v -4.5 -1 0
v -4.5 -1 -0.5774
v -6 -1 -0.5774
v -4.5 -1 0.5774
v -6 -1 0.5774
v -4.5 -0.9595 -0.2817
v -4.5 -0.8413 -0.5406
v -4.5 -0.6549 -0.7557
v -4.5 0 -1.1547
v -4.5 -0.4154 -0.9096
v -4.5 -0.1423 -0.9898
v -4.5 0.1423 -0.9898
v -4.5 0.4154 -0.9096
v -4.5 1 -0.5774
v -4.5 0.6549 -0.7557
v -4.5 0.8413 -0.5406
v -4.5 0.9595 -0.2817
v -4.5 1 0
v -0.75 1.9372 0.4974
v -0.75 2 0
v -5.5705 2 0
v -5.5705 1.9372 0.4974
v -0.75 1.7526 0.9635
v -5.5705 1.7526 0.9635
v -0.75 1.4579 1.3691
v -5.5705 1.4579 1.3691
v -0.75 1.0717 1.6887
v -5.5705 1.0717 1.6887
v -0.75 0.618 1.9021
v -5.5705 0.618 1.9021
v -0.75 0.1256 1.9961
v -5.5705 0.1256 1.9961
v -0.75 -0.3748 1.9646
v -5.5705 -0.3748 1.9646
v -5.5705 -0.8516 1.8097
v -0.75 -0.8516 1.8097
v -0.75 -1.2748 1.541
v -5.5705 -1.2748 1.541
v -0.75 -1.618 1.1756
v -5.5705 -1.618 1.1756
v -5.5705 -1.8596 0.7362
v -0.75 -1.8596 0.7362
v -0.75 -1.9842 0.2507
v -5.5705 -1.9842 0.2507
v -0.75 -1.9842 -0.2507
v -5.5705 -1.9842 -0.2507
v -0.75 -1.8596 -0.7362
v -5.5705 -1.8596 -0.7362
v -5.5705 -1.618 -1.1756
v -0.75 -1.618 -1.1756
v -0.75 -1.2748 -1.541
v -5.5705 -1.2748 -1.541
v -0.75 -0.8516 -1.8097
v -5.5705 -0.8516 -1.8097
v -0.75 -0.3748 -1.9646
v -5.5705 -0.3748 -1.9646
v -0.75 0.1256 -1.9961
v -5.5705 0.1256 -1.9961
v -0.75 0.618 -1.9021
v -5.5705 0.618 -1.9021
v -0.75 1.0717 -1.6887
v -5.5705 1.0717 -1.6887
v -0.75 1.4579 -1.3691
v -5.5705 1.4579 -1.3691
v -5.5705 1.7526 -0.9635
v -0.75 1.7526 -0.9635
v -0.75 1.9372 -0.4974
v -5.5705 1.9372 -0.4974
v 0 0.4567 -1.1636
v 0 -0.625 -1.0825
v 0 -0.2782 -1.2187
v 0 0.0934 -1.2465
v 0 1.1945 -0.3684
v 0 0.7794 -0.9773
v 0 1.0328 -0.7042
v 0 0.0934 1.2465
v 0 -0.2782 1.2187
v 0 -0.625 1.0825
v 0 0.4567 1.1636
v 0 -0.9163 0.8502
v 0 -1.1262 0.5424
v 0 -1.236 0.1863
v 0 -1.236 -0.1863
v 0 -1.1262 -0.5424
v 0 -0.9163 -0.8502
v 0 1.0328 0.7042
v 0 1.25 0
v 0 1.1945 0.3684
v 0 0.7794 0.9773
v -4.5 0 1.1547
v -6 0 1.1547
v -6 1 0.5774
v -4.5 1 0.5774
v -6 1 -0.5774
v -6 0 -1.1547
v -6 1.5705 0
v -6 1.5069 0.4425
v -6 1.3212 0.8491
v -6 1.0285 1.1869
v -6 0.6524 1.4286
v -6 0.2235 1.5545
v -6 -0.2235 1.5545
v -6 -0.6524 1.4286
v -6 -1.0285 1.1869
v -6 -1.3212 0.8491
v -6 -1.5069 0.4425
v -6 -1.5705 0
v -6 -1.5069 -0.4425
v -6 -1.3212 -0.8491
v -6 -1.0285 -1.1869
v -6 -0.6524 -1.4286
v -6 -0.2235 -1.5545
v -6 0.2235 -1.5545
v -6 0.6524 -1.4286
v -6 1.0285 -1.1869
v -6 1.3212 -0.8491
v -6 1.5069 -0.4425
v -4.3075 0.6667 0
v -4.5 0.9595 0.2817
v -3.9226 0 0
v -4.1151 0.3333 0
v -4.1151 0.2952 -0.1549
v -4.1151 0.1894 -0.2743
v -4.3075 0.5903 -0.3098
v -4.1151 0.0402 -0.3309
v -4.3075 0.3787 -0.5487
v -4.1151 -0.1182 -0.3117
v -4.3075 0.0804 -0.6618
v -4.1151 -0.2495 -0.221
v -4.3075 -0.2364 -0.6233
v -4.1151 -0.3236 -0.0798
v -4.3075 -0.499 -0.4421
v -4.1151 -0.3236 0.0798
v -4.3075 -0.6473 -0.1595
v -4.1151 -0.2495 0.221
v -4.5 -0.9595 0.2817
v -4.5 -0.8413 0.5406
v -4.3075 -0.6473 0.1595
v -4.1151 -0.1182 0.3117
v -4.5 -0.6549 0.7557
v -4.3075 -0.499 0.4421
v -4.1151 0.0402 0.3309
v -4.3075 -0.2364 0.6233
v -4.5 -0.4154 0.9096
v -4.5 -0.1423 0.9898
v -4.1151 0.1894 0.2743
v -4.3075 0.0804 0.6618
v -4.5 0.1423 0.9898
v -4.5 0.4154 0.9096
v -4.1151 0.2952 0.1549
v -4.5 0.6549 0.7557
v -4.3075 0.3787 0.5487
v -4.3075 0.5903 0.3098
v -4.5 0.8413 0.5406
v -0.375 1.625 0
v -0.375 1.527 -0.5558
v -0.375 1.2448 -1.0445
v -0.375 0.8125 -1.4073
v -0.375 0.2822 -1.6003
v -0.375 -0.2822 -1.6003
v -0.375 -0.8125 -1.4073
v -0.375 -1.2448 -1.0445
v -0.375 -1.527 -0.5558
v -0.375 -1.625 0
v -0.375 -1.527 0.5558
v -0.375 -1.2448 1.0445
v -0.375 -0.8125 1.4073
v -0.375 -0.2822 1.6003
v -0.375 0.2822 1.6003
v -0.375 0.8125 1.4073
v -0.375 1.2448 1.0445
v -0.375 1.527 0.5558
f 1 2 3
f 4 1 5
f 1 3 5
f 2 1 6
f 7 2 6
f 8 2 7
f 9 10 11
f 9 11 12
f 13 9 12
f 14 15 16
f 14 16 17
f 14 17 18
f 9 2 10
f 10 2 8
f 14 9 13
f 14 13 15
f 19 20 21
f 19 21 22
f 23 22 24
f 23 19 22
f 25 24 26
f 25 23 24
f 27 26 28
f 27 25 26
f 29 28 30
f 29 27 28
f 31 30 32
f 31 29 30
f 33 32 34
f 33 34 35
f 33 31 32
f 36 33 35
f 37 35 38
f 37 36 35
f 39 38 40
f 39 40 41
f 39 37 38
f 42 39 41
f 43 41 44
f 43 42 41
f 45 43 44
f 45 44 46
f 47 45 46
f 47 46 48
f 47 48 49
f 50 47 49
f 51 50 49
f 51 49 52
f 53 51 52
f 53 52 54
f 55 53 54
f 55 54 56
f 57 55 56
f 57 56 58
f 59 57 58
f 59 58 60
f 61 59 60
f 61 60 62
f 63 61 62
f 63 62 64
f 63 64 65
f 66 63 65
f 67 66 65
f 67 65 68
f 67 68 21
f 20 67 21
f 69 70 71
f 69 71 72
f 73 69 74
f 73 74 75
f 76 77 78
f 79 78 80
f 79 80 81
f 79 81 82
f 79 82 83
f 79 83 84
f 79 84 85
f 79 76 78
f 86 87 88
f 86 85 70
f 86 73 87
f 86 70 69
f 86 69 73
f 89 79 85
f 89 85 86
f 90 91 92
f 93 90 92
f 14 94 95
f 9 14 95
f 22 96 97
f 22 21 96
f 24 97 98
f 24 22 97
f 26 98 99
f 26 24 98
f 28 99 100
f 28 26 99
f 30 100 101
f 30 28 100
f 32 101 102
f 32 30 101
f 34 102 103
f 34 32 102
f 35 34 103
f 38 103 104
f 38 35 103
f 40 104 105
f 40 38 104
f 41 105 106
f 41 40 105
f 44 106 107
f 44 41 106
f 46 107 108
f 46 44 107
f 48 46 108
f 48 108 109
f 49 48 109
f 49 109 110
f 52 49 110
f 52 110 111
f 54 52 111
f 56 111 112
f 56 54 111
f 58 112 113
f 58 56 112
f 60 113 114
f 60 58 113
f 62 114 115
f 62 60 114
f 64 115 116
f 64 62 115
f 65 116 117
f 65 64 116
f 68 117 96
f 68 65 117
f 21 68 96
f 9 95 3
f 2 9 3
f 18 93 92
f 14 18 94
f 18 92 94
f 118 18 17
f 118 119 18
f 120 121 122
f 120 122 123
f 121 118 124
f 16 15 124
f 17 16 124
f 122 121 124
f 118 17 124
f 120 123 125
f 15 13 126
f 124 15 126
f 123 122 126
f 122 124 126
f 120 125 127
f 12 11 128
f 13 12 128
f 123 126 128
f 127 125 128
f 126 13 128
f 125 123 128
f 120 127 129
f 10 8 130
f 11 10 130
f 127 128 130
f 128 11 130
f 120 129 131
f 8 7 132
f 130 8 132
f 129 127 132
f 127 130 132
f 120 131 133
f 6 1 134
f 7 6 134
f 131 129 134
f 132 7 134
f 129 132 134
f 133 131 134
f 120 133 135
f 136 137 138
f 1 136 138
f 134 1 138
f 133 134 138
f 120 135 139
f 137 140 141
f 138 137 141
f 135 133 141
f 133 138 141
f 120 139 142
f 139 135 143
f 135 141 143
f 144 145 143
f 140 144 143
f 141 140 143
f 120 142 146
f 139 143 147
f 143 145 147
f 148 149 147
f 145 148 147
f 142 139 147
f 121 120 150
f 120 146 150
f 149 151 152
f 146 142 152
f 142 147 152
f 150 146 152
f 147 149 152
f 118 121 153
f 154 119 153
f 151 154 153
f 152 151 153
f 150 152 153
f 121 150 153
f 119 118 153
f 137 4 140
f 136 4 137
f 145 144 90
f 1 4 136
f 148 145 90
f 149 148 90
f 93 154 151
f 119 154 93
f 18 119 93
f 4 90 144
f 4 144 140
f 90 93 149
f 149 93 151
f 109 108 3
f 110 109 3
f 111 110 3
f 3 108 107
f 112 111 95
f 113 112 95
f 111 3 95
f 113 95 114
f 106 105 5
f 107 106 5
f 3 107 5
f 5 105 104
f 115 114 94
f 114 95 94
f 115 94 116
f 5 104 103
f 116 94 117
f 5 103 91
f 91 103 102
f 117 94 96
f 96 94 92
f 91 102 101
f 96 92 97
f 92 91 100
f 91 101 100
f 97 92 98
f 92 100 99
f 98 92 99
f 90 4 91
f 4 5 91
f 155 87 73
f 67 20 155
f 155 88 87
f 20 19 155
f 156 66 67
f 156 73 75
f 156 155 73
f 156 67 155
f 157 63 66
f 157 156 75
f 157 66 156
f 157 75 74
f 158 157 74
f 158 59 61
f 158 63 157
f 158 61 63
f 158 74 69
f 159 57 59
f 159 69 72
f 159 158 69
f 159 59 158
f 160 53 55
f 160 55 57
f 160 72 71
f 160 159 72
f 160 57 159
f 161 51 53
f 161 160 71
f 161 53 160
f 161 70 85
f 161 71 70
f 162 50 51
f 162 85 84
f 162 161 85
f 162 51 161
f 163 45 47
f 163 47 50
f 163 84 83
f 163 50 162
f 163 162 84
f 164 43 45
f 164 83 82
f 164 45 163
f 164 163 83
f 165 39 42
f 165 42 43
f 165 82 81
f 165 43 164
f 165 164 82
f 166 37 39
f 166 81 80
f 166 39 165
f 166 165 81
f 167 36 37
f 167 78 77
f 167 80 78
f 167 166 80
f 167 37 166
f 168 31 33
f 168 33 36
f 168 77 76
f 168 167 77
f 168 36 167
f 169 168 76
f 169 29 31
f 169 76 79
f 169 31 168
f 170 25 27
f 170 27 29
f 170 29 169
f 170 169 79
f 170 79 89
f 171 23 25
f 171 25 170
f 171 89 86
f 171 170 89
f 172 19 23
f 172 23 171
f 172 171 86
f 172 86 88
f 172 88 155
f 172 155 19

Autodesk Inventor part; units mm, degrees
sketch "Sketch_1" plane through (0, 0, 0) normal (0, 0, 1) x (1, 0, 0)
  line L0 (0, 0) -> (-6, 0)
  line L1 (-6, 0) -> (-6, 1.5705)
  line L2 (-6, 1.5705) -> (-5.5705, 2)
  line L3 (-5.5705, 2) -> (-0.75, 2)
  line L4 (-0.75, 2) -> (0, 1.25)
  line L5 (0, 1.25) -> (0, 0)
  line L6 (0, 0) -> (-6, 0)
revolve "Revolution1" add sketch "Sketch_1" angle 360 about axis through (0, 0, 0) along (1, 0, 0)
thread "Thread1" size "M4x0.7" class "6g" standard "ISO Metric profile" full length
sketch "Sketch_2" plane through (-6, 0, 0) normal (-1, 0, 0) x (0, 1, 0)
  line L0 (-1, -0.5774) -> (0, -1.1547)
  line L1 (0, -1.1547) -> (1, -0.5774)
  line L2 (1, -0.5774) -> (1, 0.5774)
  line L3 (1, 0.5774) -> (0, 1.1547)
  line L4 (0, 1.1547) -> (-1, 0.5774)
  line L5 (-1, 0.5774) -> (-1, -0.5774)
extrude "Extrusion1" cut sketch "Sketch_2" against normal blind 1.5
sketch "Sketch_3" plane through (0, 0, 0) normal (0, 0, 1) x (1, 0, 0)
  line L0 (-3.9226, 0) -> (-4.5, 0)
  line L1 (-4.5, 0) -> (-4.5, 1)
  line L2 (-4.5, 1) -> (-3.9226, 0)
  line L3 (-3.9226, 0) -> (-4.5, 0)
revolve "Revolution2" cut sketch "Sketch_3" angle 360 about axis through (-3.9226, 0, 0) along (1, 0, 0)
ref_plane "CP_XY" through (0, 0, 0) normal (1, 0, 0) x (0, 0, -1)
ref_plane "CP_YZ" through (0, 0, 0) normal (0, 0, -1) x (0, 1, 0)
ref_plane "CP_ZX" through (0, 0, 0) normal (0, 1, 0) x (1, 0, 0)
properties part number "SET-SCREW4-6"
